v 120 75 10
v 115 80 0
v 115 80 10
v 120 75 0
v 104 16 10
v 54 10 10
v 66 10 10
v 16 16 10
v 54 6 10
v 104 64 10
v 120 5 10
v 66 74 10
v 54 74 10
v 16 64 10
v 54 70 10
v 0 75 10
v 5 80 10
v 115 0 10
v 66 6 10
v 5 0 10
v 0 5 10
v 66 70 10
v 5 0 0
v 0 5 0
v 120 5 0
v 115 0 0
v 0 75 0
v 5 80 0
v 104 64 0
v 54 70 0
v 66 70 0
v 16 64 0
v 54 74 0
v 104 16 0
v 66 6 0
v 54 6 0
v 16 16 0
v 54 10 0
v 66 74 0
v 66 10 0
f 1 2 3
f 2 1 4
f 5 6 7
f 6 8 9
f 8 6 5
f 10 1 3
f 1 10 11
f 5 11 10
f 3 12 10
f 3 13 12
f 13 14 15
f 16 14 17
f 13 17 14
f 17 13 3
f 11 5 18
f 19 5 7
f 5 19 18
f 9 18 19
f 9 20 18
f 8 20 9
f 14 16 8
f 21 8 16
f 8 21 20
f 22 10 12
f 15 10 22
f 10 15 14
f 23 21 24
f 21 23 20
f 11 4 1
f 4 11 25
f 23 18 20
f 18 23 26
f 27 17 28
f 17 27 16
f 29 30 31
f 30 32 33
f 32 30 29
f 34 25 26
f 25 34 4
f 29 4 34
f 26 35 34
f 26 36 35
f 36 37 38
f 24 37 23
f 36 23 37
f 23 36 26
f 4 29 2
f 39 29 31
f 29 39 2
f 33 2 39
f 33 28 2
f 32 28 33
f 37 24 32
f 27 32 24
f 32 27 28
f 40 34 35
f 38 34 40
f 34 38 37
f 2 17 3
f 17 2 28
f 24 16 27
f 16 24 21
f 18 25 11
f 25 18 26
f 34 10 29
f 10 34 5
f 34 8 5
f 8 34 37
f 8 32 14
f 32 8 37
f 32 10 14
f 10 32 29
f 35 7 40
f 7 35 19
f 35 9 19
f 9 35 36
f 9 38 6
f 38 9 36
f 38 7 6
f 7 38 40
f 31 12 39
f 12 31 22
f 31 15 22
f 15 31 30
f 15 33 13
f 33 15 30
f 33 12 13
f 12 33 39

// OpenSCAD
$fn = 32;

// ----------------------------------------------------------------------
// Frame plate: 120 x 80 frame, 16 mm rails
// ----------------------------------------------------------------------

// --- parameters (mm) ---
plate_l = 120;            // plate length, X
plate_w = 80;             // plate width, Y
plate_t = 10;             // plate thickness, Z (extrusion height)
corner_c = 5;             // corner chamfer
frame_bar = 16;           // frame rail width
slot_l = 12;              // adjustment slot length
slot_w = 4;               // adjustment slot width

win_l = plate_l - 2 * frame_bar;  // window length
win_w = plate_w - 2 * frame_bar;  // window width

profile = [[5, 0], [115, 0], [120, 5], [120, 75], [115, 80], [5, 80], [0, 75], [0, 5]];  // primary outline, 8 points, counter clockwise
void_1 = [[16, 16], [104, 16], [104, 64], [16, 64]];  // the window, 4 points
void_2 = [[54, 6], [66, 6], [66, 10], [54, 10]];  // adjustment slot, 4 points
void_3 = [[54, 70], [66, 70], [66, 74], [54, 74]];  // adjustment slot, 4 points

// --- the one profile operation ---
difference() {
  linear_extrude(height = plate_t) polygon(points = profile);
  translate([0, 0, -1])
    linear_extrude(height = plate_t + 2) polygon(points = void_1);
  translate([0, 0, -1])
    linear_extrude(height = plate_t + 2) polygon(points = void_2);
  translate([0, 0, -1])
    linear_extrude(height = plate_t + 2) polygon(points = void_3);
}
